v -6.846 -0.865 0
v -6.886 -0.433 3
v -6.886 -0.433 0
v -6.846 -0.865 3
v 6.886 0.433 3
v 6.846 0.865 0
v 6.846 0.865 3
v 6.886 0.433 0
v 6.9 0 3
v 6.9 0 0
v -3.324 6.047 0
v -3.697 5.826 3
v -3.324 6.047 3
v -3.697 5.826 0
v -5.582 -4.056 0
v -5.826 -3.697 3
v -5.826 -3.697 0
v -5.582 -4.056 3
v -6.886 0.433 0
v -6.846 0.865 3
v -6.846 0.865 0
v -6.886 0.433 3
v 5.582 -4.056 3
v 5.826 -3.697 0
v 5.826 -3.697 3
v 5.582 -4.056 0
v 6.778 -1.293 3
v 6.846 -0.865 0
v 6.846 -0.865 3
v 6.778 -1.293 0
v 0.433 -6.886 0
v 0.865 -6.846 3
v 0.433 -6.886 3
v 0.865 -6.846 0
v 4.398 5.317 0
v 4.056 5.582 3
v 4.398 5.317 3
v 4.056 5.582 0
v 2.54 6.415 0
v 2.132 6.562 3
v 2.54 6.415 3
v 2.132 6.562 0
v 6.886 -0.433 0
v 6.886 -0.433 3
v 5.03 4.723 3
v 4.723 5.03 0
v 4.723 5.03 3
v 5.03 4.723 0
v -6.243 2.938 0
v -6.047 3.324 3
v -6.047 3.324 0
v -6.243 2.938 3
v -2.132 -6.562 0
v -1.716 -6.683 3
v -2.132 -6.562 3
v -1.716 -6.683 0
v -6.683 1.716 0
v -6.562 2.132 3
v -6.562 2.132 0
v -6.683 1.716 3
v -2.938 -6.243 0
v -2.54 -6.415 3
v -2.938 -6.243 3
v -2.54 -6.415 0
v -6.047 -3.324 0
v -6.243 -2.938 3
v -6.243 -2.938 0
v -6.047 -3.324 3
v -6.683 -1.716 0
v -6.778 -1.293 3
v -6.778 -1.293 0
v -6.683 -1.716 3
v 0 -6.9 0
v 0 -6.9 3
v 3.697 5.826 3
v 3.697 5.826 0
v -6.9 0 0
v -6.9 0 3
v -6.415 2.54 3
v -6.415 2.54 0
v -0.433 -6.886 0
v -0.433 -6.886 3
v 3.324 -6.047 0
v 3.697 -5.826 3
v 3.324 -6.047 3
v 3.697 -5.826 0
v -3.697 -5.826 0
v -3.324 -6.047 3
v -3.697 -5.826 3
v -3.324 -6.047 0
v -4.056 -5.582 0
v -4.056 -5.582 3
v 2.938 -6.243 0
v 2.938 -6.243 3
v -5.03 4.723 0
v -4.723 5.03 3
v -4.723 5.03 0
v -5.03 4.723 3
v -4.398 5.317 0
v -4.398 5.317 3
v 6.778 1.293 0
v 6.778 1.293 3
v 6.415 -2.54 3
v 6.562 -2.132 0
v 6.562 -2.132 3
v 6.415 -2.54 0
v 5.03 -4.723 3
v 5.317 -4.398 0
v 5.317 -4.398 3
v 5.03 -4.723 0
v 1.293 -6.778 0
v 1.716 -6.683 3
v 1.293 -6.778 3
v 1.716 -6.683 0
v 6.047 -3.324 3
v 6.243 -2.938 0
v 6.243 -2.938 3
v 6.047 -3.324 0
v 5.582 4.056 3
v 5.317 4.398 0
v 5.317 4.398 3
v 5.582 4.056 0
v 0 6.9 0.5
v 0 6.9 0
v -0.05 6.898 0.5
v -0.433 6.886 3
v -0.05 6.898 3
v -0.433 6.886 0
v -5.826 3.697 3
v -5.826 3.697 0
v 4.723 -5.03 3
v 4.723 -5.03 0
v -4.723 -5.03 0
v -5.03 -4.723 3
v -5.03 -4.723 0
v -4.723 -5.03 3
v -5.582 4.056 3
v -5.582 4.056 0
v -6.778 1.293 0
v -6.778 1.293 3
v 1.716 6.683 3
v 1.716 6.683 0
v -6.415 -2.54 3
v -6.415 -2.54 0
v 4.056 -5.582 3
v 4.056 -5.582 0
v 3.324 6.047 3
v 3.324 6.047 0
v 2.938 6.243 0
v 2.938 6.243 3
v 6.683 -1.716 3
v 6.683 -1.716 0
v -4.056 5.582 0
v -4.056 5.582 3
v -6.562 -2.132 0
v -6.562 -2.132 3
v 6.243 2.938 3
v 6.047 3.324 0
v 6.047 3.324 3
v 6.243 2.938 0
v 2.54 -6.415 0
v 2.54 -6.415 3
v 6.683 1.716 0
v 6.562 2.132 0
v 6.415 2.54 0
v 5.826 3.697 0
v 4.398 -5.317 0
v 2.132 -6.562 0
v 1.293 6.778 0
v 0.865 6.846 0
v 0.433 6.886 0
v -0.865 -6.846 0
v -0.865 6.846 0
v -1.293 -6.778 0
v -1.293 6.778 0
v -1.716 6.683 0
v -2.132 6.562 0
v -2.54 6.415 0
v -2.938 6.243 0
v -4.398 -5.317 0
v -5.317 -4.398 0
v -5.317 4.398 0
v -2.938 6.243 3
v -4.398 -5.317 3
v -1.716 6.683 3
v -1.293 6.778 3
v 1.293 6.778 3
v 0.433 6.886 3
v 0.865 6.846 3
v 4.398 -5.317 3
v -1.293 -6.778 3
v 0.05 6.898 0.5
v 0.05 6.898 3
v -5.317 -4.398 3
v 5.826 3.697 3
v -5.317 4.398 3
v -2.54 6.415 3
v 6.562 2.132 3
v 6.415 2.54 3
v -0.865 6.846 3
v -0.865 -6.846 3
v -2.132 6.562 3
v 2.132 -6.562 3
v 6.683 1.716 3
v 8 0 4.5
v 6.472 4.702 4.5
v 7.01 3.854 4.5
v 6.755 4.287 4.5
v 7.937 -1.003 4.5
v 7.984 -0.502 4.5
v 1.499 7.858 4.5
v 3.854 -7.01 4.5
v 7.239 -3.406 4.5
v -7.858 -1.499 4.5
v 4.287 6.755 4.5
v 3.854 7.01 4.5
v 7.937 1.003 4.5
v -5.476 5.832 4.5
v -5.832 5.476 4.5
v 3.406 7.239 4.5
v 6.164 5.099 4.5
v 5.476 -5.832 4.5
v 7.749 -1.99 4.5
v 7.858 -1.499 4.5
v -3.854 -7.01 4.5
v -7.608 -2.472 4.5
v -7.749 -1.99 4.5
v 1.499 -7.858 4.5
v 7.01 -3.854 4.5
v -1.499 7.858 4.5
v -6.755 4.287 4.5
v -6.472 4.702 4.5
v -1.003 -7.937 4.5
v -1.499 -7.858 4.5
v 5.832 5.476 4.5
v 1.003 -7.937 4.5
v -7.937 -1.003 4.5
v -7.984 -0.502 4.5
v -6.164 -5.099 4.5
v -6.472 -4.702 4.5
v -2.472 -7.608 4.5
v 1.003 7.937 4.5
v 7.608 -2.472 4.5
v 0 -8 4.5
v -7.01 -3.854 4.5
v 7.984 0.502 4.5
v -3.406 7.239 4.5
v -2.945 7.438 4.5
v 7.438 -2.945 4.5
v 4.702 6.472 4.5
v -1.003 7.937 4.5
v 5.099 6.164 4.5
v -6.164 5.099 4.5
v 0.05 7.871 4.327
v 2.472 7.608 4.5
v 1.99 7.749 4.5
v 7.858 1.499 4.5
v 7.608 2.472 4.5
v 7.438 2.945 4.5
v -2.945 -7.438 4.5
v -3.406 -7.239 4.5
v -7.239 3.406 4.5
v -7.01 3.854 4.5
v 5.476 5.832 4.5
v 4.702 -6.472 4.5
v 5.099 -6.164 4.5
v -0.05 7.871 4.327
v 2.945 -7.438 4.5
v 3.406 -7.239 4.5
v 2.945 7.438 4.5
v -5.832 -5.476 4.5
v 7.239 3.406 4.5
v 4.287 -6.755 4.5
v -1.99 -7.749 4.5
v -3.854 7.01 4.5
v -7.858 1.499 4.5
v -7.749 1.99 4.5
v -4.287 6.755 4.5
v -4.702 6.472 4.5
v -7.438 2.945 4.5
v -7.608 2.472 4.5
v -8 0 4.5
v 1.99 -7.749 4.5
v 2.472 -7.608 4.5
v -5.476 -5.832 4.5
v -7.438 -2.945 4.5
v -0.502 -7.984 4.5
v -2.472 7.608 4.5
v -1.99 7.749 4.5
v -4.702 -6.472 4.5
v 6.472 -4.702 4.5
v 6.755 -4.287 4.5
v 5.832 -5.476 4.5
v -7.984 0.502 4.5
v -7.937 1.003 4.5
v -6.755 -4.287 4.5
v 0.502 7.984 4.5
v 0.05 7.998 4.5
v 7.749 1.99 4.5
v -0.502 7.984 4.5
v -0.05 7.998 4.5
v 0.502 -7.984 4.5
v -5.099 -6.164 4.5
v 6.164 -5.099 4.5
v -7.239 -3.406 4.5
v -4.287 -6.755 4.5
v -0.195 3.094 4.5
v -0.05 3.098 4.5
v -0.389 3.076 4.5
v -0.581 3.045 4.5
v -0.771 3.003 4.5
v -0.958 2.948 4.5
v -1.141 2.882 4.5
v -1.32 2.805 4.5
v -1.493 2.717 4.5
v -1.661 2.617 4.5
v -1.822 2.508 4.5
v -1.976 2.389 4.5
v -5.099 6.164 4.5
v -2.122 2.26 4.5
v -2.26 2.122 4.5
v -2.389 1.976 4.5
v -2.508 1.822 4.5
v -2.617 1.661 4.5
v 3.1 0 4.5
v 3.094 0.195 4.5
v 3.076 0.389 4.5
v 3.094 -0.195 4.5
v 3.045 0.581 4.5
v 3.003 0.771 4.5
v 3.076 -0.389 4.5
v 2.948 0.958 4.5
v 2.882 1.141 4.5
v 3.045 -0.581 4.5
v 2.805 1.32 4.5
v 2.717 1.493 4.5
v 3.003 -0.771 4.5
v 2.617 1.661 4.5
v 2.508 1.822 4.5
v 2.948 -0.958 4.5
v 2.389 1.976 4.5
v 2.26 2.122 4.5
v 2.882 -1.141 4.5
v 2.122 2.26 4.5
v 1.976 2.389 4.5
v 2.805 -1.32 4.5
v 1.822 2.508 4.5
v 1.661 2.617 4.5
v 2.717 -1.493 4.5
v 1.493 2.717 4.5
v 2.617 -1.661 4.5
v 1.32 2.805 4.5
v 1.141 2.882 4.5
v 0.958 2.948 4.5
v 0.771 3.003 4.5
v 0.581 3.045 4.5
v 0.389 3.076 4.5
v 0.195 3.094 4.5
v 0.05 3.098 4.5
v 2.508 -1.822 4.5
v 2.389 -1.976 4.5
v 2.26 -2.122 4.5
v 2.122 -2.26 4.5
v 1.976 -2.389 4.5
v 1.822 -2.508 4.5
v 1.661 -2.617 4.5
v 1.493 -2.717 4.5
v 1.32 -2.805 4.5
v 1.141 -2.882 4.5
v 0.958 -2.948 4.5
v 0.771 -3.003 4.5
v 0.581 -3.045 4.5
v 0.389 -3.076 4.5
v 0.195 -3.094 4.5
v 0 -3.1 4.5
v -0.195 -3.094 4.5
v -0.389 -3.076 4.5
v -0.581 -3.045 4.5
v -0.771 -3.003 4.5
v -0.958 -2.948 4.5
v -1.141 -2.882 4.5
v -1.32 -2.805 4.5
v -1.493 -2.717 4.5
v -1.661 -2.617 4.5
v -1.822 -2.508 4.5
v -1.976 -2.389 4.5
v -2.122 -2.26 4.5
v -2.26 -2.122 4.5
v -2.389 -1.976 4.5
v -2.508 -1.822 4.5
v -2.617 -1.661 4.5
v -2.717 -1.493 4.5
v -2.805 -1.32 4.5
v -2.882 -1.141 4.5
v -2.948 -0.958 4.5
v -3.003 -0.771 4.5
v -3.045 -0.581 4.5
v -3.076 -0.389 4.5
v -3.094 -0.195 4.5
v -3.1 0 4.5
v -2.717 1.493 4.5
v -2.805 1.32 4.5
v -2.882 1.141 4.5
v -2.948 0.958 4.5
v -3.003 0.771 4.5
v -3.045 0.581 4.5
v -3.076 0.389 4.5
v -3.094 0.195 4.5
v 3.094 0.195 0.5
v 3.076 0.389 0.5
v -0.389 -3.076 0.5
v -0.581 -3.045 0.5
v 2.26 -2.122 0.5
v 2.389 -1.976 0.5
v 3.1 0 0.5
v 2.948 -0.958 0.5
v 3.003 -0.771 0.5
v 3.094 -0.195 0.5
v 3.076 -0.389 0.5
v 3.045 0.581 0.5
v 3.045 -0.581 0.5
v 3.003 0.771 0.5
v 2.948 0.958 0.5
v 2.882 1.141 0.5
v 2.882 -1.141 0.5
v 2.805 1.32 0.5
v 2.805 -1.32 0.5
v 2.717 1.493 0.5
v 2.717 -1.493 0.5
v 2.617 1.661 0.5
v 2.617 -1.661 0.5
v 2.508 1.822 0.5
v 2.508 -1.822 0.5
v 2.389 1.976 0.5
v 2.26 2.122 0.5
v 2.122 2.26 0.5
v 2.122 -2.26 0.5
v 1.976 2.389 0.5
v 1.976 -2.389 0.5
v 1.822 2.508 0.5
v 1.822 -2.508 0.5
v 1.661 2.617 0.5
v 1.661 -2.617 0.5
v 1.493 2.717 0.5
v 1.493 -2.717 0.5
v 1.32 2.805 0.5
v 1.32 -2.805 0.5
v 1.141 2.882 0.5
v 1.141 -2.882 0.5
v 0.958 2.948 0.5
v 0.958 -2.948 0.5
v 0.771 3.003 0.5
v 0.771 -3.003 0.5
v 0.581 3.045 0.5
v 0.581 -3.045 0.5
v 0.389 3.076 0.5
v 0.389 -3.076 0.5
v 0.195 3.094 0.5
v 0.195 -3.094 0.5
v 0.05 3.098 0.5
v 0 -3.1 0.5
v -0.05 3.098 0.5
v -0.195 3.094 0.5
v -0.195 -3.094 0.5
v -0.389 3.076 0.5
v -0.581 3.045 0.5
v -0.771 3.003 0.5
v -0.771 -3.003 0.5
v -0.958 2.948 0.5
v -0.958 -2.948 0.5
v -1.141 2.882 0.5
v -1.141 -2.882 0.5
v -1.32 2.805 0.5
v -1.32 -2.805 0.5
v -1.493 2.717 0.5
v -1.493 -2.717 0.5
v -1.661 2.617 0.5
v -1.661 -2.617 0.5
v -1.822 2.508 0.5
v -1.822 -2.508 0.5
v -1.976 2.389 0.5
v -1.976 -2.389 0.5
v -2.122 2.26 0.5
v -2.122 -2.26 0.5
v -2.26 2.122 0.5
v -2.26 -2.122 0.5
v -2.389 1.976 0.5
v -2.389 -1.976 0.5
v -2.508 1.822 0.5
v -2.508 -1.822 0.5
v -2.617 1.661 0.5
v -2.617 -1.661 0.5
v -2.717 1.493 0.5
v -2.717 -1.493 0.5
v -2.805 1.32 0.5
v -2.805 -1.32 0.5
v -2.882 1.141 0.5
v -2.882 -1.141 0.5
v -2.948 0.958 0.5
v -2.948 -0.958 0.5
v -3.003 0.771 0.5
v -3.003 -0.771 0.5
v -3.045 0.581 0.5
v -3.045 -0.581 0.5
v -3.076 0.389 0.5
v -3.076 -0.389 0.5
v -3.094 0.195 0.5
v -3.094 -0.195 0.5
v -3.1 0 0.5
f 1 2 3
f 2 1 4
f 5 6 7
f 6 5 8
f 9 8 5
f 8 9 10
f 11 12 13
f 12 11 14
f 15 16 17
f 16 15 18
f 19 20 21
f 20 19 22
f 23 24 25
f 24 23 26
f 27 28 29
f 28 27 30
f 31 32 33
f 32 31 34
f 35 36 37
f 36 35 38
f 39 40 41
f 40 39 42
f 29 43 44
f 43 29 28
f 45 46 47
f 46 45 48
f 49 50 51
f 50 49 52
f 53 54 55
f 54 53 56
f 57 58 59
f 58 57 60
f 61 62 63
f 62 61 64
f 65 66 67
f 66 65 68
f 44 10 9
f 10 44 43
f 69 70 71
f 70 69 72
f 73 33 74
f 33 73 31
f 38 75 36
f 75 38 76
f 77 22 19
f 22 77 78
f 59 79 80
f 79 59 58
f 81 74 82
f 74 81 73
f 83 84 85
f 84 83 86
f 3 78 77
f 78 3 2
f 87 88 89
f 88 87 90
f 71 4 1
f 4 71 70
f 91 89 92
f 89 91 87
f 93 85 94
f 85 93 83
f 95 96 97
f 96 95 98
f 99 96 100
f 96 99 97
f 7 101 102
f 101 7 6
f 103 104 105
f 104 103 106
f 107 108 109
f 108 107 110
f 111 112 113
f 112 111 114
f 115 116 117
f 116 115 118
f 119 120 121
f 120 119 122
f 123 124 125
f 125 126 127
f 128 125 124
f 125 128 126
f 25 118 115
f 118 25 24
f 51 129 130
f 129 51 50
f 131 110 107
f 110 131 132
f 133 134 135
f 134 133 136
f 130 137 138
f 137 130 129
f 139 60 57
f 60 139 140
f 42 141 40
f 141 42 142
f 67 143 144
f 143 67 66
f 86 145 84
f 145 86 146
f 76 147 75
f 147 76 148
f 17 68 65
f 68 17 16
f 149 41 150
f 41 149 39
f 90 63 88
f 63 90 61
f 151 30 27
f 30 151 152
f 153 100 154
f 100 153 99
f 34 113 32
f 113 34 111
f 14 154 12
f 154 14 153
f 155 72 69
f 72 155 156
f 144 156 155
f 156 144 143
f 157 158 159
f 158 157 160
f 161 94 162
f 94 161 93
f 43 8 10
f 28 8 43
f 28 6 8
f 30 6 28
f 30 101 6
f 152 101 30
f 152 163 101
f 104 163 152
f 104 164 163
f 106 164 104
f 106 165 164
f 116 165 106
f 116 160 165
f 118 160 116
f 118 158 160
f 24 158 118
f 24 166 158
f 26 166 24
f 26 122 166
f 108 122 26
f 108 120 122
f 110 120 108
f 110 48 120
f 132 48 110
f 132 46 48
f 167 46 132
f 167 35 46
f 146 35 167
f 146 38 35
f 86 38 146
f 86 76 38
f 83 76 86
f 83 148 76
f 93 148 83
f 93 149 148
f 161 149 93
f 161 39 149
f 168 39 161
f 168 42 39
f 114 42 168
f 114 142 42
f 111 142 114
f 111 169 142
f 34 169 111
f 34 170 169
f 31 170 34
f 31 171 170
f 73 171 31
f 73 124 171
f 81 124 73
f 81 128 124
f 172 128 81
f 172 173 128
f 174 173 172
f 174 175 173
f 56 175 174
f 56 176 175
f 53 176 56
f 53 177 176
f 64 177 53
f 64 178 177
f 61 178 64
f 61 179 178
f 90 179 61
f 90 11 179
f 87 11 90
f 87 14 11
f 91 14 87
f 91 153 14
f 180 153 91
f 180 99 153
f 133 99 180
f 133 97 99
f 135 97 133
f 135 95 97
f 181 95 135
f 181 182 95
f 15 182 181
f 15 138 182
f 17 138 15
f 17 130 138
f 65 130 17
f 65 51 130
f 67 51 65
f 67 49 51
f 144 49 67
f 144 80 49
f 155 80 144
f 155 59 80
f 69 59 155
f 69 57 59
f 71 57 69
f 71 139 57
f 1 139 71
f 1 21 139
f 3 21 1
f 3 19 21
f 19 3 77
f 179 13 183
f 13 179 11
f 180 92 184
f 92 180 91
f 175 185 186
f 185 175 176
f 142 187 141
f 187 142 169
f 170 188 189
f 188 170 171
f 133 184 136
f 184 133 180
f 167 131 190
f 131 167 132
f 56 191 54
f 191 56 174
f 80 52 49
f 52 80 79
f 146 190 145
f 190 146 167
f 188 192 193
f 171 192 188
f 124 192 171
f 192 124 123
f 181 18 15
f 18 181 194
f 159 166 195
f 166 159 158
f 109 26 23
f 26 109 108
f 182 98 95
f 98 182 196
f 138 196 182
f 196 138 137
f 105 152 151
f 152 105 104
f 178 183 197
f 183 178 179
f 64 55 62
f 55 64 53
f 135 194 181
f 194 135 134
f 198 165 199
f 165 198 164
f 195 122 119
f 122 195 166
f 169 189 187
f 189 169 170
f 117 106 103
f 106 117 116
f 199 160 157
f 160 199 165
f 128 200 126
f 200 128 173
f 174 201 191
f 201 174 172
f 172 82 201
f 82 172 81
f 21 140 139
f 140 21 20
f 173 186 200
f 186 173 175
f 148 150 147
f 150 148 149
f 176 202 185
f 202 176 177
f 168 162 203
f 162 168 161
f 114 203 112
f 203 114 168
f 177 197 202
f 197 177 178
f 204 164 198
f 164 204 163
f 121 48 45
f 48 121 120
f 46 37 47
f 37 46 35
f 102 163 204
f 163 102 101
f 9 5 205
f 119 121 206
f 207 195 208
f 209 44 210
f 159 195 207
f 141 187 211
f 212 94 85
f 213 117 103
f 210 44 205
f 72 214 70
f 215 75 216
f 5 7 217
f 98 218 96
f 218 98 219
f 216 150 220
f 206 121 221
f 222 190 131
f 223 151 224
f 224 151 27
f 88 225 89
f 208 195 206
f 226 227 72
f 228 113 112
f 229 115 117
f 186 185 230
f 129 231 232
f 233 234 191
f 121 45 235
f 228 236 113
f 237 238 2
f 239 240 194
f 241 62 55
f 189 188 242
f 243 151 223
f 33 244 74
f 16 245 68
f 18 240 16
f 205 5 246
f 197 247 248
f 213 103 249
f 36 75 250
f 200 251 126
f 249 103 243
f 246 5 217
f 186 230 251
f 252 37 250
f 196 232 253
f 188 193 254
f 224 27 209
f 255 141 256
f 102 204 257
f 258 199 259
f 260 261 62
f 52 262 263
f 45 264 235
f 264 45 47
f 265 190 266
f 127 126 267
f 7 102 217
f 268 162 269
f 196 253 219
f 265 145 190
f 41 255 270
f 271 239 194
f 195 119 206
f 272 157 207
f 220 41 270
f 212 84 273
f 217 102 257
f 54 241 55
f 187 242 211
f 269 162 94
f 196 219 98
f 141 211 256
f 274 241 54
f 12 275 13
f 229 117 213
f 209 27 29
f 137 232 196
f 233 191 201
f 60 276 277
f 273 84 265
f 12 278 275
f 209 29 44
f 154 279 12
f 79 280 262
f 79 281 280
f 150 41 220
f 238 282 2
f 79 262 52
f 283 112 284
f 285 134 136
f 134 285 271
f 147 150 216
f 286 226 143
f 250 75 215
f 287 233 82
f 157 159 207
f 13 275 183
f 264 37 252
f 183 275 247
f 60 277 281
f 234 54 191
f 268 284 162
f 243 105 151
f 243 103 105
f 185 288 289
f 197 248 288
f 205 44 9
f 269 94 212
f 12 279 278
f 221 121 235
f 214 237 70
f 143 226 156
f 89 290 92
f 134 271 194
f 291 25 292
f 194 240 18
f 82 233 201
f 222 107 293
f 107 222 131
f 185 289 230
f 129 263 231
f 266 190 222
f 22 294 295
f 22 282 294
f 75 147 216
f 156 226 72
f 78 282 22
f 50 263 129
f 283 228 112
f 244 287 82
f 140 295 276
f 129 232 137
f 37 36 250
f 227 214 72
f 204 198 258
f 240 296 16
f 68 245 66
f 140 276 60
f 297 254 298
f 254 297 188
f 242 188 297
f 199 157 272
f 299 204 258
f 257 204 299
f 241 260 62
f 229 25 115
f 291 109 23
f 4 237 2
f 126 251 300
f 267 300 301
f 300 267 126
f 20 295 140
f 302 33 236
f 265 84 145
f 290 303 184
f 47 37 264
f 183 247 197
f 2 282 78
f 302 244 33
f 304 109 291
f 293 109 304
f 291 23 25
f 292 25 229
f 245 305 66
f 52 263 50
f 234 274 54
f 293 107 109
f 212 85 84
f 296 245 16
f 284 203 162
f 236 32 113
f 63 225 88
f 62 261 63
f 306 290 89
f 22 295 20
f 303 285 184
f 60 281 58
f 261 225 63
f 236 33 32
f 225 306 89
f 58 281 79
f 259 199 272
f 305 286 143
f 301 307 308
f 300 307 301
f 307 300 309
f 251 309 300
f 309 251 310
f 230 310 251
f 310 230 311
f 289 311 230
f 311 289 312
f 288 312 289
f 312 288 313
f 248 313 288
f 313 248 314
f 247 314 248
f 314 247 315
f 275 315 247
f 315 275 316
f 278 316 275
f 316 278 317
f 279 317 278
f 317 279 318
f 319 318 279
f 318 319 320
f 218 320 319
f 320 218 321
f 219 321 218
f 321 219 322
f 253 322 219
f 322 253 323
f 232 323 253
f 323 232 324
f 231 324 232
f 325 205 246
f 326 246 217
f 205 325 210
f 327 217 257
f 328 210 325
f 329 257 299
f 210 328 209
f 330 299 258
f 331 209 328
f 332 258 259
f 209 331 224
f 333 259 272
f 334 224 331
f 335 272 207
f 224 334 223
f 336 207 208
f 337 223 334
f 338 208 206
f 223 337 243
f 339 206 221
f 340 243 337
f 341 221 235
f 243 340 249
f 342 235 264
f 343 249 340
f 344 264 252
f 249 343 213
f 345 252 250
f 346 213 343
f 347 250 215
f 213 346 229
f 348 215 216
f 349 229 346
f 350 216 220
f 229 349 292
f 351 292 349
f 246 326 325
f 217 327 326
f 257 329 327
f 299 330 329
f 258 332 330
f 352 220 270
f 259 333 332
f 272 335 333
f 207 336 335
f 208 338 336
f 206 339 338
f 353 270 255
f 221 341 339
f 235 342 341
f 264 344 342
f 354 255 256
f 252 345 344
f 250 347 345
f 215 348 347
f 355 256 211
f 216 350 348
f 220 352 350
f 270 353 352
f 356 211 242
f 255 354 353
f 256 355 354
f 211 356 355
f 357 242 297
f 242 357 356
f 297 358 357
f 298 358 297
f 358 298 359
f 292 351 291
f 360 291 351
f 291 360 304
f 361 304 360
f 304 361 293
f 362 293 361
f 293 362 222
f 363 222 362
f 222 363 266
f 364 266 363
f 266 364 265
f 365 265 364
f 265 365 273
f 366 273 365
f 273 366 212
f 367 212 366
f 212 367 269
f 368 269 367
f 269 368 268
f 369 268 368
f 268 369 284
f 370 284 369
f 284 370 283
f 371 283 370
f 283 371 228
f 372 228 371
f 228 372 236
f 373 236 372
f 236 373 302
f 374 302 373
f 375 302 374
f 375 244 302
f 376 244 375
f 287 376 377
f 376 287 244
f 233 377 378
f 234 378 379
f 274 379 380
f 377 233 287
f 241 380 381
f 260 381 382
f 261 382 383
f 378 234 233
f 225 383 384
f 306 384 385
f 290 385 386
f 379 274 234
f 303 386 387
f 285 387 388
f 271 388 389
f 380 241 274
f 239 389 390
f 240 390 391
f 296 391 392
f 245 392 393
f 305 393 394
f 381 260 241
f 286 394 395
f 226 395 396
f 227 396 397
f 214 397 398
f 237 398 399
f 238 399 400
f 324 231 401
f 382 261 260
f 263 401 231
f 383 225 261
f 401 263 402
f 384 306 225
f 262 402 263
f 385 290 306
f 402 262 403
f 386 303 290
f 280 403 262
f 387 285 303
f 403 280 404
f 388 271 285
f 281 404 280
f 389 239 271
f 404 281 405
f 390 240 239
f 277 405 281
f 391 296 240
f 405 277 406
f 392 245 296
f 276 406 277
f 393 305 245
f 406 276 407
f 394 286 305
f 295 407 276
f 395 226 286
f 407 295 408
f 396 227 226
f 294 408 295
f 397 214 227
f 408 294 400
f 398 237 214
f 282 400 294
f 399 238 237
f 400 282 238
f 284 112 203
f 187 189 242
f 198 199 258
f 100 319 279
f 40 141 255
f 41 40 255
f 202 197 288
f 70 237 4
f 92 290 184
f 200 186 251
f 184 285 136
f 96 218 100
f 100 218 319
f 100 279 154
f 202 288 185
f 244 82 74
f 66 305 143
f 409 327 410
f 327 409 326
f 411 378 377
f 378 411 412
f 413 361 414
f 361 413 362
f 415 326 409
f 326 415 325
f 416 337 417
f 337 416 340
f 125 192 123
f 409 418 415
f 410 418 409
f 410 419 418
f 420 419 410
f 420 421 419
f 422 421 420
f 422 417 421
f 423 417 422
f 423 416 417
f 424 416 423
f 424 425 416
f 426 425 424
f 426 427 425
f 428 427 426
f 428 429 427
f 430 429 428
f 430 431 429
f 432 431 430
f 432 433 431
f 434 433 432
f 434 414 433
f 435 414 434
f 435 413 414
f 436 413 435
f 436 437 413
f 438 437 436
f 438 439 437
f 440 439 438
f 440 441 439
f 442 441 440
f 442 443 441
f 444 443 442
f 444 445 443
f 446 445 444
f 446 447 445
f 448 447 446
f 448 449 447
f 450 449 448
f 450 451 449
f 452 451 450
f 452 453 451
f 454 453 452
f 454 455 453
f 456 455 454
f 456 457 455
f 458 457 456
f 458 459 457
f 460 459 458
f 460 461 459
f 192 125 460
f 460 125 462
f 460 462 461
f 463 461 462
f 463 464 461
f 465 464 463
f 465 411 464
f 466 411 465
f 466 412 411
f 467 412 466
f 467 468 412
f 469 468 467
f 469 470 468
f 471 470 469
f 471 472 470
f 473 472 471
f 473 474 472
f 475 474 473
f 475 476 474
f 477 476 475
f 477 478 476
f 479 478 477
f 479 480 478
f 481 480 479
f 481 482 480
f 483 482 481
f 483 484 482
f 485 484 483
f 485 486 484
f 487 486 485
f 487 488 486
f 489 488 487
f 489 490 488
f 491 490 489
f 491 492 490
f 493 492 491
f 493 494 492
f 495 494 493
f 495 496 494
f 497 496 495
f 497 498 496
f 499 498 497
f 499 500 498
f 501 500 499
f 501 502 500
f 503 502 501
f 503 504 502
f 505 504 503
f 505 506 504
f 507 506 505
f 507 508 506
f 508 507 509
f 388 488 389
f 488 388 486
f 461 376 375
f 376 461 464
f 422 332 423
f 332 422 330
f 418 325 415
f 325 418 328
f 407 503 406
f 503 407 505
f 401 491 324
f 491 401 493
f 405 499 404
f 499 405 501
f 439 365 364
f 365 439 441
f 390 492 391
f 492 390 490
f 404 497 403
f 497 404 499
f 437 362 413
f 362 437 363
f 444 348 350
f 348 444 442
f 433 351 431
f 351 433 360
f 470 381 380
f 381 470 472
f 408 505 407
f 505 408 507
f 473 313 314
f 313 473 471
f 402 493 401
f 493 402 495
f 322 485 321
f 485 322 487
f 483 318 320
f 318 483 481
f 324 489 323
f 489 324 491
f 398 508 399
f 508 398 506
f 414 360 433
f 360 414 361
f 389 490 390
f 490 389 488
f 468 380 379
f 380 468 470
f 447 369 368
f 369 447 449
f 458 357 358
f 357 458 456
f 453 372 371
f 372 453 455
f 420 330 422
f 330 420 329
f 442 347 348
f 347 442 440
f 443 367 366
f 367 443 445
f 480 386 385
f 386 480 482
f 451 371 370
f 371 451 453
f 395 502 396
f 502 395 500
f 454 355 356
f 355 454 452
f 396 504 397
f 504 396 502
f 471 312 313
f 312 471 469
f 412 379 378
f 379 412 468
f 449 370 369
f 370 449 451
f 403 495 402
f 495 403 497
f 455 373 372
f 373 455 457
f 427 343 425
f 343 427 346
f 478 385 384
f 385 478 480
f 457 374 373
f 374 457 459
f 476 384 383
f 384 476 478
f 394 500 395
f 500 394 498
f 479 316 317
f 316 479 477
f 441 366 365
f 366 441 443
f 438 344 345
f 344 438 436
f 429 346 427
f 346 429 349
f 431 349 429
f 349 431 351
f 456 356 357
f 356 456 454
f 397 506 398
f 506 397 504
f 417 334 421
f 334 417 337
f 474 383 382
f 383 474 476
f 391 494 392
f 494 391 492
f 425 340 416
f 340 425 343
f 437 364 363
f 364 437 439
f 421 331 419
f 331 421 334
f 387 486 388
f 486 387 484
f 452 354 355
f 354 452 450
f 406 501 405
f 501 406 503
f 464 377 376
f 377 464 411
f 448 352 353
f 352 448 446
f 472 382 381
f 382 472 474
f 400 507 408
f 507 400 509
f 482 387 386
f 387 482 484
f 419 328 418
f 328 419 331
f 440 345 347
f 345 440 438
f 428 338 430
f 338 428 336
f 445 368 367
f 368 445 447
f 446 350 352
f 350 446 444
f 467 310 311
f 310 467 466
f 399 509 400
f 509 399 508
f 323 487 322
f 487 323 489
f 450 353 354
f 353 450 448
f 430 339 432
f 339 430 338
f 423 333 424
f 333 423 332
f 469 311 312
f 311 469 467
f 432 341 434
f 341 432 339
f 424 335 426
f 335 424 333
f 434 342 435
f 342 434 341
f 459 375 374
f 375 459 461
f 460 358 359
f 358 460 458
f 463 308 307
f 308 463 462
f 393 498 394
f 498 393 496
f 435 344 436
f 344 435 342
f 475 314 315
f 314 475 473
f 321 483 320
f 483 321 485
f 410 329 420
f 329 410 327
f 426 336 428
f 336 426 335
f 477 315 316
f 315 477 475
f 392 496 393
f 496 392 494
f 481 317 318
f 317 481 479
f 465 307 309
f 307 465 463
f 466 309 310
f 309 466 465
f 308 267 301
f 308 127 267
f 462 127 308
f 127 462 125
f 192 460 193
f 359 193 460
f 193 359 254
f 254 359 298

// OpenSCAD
difference(){
        union() {
            linear_extrude(3) circle(6.9,$fn=100);
            translate([0,0,3]) cylinder(1.5,6.9,8,$fn=100);
        }
        // 磁石埋め込み穴
        color("red") translate([0,0,0.5]) linear_extrude(4) circle(3.1,$fn=100);
        // 穴強化スリット
        color("red") translate([0,6,0.5]) linear_extrude(4) square([0.1,7],center=true);
    }
